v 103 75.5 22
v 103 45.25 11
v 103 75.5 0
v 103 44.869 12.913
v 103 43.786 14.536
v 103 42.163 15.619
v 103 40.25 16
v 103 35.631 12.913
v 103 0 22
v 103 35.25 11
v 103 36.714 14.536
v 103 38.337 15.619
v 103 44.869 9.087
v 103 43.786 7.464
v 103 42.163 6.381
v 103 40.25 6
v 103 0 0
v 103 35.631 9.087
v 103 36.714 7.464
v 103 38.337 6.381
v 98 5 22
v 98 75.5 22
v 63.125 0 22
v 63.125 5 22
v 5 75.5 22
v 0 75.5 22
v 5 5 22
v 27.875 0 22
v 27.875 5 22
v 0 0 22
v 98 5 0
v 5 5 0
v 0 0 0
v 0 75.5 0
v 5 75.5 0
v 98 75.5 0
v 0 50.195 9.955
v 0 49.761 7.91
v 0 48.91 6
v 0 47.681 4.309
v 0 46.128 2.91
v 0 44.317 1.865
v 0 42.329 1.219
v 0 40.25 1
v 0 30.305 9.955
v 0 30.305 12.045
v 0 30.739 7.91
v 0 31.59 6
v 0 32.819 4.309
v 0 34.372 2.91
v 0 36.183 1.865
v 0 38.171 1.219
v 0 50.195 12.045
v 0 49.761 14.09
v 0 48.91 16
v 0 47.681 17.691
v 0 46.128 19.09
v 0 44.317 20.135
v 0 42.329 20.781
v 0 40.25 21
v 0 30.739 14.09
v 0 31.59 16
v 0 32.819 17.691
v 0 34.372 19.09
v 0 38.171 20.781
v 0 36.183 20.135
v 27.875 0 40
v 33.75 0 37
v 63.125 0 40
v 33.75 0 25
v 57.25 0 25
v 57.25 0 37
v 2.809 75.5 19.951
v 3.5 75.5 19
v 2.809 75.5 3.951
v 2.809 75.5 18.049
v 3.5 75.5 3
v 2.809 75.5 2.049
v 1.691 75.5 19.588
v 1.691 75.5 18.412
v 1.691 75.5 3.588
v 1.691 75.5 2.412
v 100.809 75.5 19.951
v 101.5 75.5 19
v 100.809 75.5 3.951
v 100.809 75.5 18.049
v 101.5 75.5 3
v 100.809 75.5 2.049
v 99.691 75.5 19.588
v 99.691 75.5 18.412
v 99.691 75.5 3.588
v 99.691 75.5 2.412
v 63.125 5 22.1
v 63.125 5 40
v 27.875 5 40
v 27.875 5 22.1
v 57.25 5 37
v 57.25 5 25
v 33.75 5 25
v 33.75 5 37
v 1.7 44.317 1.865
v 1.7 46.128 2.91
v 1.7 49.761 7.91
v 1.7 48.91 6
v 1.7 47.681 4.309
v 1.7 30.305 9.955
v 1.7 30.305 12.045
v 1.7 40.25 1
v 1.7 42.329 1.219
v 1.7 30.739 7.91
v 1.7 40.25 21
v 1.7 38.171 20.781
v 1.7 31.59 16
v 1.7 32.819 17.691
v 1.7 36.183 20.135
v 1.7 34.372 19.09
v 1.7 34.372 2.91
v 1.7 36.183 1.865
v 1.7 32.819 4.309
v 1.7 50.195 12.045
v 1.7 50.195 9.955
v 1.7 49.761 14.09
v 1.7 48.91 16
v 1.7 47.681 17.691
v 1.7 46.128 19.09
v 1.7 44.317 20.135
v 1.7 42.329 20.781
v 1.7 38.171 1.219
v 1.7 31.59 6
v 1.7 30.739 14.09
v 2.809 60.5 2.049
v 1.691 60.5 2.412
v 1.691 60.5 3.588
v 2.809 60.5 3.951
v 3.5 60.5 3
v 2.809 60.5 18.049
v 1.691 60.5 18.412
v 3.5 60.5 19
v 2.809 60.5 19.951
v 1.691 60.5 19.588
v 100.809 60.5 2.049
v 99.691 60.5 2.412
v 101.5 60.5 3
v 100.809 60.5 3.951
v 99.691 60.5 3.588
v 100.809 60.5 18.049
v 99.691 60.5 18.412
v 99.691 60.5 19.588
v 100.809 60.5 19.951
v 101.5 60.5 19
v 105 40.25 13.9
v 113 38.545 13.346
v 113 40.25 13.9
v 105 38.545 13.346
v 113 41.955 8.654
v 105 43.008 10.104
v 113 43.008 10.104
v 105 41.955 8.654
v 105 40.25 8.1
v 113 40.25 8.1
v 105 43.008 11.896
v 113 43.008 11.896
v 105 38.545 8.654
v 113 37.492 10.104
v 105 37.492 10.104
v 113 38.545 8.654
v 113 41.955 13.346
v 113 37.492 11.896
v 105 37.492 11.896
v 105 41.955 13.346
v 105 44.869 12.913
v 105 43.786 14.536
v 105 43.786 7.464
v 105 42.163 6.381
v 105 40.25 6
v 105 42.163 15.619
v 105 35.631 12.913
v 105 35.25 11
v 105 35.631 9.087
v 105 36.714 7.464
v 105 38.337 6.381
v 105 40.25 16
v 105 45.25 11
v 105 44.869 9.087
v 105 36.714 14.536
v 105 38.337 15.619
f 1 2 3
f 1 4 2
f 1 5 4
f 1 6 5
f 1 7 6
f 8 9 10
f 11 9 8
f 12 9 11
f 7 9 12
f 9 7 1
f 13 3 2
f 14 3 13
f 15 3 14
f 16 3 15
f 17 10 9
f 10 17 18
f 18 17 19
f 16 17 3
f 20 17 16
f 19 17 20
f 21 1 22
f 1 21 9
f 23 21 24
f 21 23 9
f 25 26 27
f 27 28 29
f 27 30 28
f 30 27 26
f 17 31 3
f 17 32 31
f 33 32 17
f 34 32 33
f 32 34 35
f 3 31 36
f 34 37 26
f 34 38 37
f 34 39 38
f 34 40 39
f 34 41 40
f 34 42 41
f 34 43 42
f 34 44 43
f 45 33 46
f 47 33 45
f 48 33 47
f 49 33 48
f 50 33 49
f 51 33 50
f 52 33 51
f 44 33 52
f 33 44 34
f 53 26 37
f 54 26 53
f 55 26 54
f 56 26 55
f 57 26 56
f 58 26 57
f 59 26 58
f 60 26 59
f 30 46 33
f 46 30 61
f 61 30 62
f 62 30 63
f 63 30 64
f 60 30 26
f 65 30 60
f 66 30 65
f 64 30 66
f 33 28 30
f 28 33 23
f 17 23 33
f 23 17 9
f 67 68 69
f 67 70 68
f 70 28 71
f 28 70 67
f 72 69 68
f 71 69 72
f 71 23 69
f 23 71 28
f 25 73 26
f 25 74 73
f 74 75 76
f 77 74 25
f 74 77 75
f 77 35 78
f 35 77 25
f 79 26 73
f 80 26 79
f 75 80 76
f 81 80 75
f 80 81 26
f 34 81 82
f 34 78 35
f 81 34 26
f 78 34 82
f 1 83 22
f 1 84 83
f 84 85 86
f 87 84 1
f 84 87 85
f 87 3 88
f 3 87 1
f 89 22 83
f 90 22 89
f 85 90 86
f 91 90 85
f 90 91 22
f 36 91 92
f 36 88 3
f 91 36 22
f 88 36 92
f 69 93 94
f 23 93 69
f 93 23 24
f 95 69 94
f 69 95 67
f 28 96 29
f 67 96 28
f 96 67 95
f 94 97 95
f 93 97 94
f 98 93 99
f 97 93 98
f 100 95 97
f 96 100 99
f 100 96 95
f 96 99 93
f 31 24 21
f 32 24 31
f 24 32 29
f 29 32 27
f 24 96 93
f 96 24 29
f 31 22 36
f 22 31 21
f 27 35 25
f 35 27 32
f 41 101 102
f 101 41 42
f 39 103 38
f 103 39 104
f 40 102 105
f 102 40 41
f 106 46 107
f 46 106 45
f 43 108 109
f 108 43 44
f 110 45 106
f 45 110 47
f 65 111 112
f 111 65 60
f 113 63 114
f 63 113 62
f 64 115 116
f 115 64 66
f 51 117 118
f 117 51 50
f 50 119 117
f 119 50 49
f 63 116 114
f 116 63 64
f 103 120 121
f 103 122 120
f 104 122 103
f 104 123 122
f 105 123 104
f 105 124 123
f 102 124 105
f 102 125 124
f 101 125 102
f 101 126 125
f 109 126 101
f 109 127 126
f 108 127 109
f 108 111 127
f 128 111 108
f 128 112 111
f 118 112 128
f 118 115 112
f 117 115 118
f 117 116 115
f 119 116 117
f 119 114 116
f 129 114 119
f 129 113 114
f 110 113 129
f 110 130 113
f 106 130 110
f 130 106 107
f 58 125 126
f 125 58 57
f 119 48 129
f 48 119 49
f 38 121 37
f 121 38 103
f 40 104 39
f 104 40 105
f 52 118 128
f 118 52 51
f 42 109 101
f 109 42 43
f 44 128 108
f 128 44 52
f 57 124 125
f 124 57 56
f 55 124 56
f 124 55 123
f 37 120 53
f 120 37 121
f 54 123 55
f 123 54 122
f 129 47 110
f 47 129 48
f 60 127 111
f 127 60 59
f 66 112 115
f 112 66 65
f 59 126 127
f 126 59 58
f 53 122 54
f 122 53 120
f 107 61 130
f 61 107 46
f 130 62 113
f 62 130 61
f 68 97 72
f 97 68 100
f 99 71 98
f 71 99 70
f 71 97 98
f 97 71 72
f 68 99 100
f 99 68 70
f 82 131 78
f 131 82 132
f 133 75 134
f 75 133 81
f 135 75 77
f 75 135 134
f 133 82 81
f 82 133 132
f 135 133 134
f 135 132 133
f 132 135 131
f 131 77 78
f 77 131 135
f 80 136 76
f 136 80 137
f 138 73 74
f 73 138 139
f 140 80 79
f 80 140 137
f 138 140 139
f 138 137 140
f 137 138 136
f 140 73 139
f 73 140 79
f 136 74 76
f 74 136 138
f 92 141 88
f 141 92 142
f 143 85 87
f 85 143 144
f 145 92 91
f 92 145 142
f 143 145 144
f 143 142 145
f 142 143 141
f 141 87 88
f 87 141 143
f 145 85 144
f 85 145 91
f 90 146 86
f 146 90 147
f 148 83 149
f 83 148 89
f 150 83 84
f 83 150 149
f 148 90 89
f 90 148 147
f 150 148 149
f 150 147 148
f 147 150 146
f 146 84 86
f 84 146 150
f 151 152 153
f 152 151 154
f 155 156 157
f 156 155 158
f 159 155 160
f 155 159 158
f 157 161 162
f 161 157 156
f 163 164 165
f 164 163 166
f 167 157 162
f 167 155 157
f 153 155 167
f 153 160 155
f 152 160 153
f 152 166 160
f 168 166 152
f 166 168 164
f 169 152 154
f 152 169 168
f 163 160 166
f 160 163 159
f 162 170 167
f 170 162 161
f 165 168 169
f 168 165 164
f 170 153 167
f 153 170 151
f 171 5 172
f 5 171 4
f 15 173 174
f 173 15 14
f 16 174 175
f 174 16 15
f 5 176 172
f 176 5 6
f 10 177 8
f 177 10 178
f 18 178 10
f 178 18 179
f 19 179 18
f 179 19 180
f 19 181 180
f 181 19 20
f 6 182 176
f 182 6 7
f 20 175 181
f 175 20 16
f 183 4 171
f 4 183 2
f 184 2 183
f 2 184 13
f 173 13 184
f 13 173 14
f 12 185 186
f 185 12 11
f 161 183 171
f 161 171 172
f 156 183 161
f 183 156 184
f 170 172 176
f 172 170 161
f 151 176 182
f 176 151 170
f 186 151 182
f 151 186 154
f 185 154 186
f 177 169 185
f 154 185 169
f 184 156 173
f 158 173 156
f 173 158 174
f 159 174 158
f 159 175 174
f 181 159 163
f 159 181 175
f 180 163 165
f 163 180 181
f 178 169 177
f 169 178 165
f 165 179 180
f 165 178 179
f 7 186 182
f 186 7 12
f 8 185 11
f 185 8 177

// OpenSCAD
// file: servo.scad
include <variables.scad>

// Cutout for servo body
module servoCutout(thickness) {
    cube([servoWidth, servoHeight, thickness]);
}

// Cutout for servo mounting plate
module servoPlateCutout() {
    cylinder(h = servoPlateThickness + DIFFERENCE_FIX_2, r = servoPlateRadius);
}
// file: frame.scad
include <variables.scad>

use <servo.scad>

// Frame
module frame() {
    difference() {
        frameBody();
        frameServoPlateCutout();
        frameHoleTop();
        frameShutterCutout();
        frameServoCutout();
        frameScrewHole(frameThickness / 2, frameScrewHoleOffsetZ);
        frameScrewHole(frameThickness / 2, frameDepth - frameScrewHoleOffsetZ);
        frameScrewHole(frameWidth - frameThickness / 2, frameScrewHoleOffsetZ);
        frameScrewHole(frameWidth - frameThickness / 2, frameDepth - frameScrewHoleOffsetZ);
    }

    framePinRight();
}

// Frame body
module frameBody() {
    difference() {
        // Frame
        union() {
            cube([
                frameWidth,
                frameHeight,
                frameDepth
            ]);

            frameExtensionTop();
            frameExtensionBottom();
        }

        // Frame cutout
        translate([frameThickness, frameThickness, DIFFERENCE_FIX_NEGATIVE])
        cube([
            frameWidth - 2 * frameThickness,
            frameHeight - 2 * frameThickness,
            frameDepth + DIFFERENCE_FIX_2
        ]);
    }
}

// Extension for top camera mounting pin
module frameExtensionTop() {
    translate([frameWidth / 2 - frameExtensionTopWidth / 2, frameHeight - frameThickness, frameDepth])
    cube([frameExtensionTopWidth, frameThickness, frameExtensionDepth]);
}


// Extension from servo cutout
module frameExtensionBottom() {
    translate([frameWidth / 2 - frameExtensionBottomWidth / 2 - servoOffsetTop, 0, frameDepth])
    cube([frameExtensionBottomWidth, frameThickness, frameExtensionDepth]);
}

// Cutout for support servo mounting plate
module frameServoPlateCutout() {
    translate([DIFFERENCE_FIX_NEGATIVE, frameHeight / 2, frameDepth / 2])
    rotate([0, 90, 0])
    servoPlateCutout();
}

// Cutout for servo
module frameServoCutout() {
    translate([
        frameWidth / 2 - servoHeight / 2 - servoOffsetTop,
        DIFFERENCE_FIX_NEGATIVE,
        frameDepth + frameExtensionDepth / 2 - servoWidth / 2
    ])
    rotate([270, 270, 0])
    servoCutout(frameThickness + DIFFERENCE_FIX_2);
}

// Pin for right support
module framePinRight() {
    translate([frameWidth, frameHeight / 2, frameDepth / 2])
    rotate([0, 90, 0])
    union() {
        cylinder(h = supportThickness + framePinOffsetHeight, r = supportRightHoleRadius - framePinRadiusOffset);
        cylinder(h = framePinOffsetHeight, r = framePinOffsetRadius);
    }
}

// Hole in the top for camera mount pin
module frameHoleTop() {
    translate([frameWidth / 2, frameHeight - frameThickness - DIFFERENCE_FIX, frameHoleTopDepth])
    rotate([0, 90, 90])
    cylinder(h = frameThickness + DIFFERENCE_FIX_2, r = frameHoleTopRadius);
}

// Cutout for shutter
module frameShutterCutout() {
    translate([frameShutterCutoutOffsetX, frameHeight + DIFFERENCE_FIX, frameDepth - frameShutterCutoutHeight + DIFFERENCE_FIX])
    rotate([90, 0, 0])
    cube([frameShutterCutoutWidth, frameShutterCutoutHeight + DIFFERENCE_FIX_2, frameThickness + DIFFERENCE_FIX_2]);
}

// Screw hole for top part of frame
module frameScrewHole(offsetX, offsetZ) {
    translate([offsetX, frameHeight + DIFFERENCE_FIX, offsetZ])
    rotate([90, 0, 0])
    cylinder(h = frameScrewHoleHeight + DIFFERENCE_FIX, r = frameScrewHoleRadius);
}

frame();
// file: variables.scad
// General
DIFFERENCE_FIX = 0.1;
DIFFERENCE_FIX_NEGATIVE = -1 * DIFFERENCE_FIX;
DIFFERENCE_FIX_2 = 2 * DIFFERENCE_FIX;

componentThickness = 5;
screwHoleRadius = 1;
screwHoleDepth = 20;

// Servo cutout
servoWidth = 12;
servoHeight = 23.5;
servoOffsetTop = 6;
servoFlangeDistance = 12.5;

// Servo mounting plate
servoPlateRadius = 10;
servoPlateThickness = 1.6;

// Support
supportThickness = 8;
supportHoleHeight = 65;
supportWidth = 50;
supportTaper = 12;
supportBaseDepth = 15;
supportMountingHoleRadius = 2;

// Support right
supportRightHoleRadius = 3;

// Camera mount
cameraMountGoproWidth = 63;
cameraMountGoproHeight = 45;
cameraMountGoproDepth = 25;

cameraMountThickness = componentThickness;
cameraMountWidth = cameraMountGoproWidth + 2 * cameraMountThickness;
cameraMountHeight = cameraMountGoproHeight + 2 * cameraMountThickness;
cameraMountDepth = cameraMountGoproDepth + cameraMountThickness;

cameraMountShutterCutoutWidth = 13;
cameraMountShutterCutoutOffsetX = 8;
cameraMountShutterCutoutOffsetZ = 6;
cameraMountShutterCutoutGap = componentThickness;

cameraMountPowerCutoutDepth = 10;
cameraMountPowerCutoutHeight = 9;
cameraMountPowerCutoutOffsetY = 9;
cameraMountPowerCutoutOffsetZ = 7;
cameraMountPowerCutoutGap = componentThickness;

cameraMountBackCutoutOffset = 8;

cameraMountPinOffsetRadius = supportRightHoleRadius + 2;
cameraMountPinOffsetHeight = 2;
cameraMountPinRadiusOffset = 0.1;

cameraMountScrewHoleRadius = screwHoleRadius;
cameraMountScrewHoleDepth = screwHoleDepth;

// Frame
framePinOffsetRadius = cameraMountPinOffsetRadius;
framePinOffsetHeight = cameraMountPinOffsetHeight;
framePinRadiusOffset = cameraMountPinRadiusOffset;

frameCameraMountOffsetX = 10;
frameThickness = componentThickness;
frameWidth = cameraMountWidth + 2 * frameThickness + 2 * frameCameraMountOffsetX;
frameHeight = cameraMountHeight + 2 * frameThickness + servoFlangeDistance + framePinOffsetHeight + 1;
frameDepth = 22;

frameHoleTopRadius = supportRightHoleRadius;

frameExtensionDepth = servoWidth * 1.5;
frameExtensionTopWidth = frameHoleTopRadius * 3;
frameExtensionBottomWidth = servoHeight * 1.5;

frameHoleTopDepth = frameDepth + frameExtensionDepth / 2;

frameShutterCutoutWidth = 25;
frameShutterCutoutHeight = 18;
frameShutterCutoutOffsetX = 22;

frameScrewHoleHeight = screwHoleDepth;
frameScrewHoleRadius = screwHoleRadius;
frameScrewHoleOffsetZ = 3;

// Lock
lockHeight = 20;
lockThickness = 2;
lockWidth = frameThickness;
// main file
include <variables.scad>

use <frame.scad>


// Frame Bottom
module frameBottom() {
    difference() {
        frame();

        translate([0, frameHeight - frameThickness, 0])
        cube([
            frameWidth,
            frameThickness,
            frameDepth + frameExtensionDepth
       ]);
    }
}

frameBottom();
